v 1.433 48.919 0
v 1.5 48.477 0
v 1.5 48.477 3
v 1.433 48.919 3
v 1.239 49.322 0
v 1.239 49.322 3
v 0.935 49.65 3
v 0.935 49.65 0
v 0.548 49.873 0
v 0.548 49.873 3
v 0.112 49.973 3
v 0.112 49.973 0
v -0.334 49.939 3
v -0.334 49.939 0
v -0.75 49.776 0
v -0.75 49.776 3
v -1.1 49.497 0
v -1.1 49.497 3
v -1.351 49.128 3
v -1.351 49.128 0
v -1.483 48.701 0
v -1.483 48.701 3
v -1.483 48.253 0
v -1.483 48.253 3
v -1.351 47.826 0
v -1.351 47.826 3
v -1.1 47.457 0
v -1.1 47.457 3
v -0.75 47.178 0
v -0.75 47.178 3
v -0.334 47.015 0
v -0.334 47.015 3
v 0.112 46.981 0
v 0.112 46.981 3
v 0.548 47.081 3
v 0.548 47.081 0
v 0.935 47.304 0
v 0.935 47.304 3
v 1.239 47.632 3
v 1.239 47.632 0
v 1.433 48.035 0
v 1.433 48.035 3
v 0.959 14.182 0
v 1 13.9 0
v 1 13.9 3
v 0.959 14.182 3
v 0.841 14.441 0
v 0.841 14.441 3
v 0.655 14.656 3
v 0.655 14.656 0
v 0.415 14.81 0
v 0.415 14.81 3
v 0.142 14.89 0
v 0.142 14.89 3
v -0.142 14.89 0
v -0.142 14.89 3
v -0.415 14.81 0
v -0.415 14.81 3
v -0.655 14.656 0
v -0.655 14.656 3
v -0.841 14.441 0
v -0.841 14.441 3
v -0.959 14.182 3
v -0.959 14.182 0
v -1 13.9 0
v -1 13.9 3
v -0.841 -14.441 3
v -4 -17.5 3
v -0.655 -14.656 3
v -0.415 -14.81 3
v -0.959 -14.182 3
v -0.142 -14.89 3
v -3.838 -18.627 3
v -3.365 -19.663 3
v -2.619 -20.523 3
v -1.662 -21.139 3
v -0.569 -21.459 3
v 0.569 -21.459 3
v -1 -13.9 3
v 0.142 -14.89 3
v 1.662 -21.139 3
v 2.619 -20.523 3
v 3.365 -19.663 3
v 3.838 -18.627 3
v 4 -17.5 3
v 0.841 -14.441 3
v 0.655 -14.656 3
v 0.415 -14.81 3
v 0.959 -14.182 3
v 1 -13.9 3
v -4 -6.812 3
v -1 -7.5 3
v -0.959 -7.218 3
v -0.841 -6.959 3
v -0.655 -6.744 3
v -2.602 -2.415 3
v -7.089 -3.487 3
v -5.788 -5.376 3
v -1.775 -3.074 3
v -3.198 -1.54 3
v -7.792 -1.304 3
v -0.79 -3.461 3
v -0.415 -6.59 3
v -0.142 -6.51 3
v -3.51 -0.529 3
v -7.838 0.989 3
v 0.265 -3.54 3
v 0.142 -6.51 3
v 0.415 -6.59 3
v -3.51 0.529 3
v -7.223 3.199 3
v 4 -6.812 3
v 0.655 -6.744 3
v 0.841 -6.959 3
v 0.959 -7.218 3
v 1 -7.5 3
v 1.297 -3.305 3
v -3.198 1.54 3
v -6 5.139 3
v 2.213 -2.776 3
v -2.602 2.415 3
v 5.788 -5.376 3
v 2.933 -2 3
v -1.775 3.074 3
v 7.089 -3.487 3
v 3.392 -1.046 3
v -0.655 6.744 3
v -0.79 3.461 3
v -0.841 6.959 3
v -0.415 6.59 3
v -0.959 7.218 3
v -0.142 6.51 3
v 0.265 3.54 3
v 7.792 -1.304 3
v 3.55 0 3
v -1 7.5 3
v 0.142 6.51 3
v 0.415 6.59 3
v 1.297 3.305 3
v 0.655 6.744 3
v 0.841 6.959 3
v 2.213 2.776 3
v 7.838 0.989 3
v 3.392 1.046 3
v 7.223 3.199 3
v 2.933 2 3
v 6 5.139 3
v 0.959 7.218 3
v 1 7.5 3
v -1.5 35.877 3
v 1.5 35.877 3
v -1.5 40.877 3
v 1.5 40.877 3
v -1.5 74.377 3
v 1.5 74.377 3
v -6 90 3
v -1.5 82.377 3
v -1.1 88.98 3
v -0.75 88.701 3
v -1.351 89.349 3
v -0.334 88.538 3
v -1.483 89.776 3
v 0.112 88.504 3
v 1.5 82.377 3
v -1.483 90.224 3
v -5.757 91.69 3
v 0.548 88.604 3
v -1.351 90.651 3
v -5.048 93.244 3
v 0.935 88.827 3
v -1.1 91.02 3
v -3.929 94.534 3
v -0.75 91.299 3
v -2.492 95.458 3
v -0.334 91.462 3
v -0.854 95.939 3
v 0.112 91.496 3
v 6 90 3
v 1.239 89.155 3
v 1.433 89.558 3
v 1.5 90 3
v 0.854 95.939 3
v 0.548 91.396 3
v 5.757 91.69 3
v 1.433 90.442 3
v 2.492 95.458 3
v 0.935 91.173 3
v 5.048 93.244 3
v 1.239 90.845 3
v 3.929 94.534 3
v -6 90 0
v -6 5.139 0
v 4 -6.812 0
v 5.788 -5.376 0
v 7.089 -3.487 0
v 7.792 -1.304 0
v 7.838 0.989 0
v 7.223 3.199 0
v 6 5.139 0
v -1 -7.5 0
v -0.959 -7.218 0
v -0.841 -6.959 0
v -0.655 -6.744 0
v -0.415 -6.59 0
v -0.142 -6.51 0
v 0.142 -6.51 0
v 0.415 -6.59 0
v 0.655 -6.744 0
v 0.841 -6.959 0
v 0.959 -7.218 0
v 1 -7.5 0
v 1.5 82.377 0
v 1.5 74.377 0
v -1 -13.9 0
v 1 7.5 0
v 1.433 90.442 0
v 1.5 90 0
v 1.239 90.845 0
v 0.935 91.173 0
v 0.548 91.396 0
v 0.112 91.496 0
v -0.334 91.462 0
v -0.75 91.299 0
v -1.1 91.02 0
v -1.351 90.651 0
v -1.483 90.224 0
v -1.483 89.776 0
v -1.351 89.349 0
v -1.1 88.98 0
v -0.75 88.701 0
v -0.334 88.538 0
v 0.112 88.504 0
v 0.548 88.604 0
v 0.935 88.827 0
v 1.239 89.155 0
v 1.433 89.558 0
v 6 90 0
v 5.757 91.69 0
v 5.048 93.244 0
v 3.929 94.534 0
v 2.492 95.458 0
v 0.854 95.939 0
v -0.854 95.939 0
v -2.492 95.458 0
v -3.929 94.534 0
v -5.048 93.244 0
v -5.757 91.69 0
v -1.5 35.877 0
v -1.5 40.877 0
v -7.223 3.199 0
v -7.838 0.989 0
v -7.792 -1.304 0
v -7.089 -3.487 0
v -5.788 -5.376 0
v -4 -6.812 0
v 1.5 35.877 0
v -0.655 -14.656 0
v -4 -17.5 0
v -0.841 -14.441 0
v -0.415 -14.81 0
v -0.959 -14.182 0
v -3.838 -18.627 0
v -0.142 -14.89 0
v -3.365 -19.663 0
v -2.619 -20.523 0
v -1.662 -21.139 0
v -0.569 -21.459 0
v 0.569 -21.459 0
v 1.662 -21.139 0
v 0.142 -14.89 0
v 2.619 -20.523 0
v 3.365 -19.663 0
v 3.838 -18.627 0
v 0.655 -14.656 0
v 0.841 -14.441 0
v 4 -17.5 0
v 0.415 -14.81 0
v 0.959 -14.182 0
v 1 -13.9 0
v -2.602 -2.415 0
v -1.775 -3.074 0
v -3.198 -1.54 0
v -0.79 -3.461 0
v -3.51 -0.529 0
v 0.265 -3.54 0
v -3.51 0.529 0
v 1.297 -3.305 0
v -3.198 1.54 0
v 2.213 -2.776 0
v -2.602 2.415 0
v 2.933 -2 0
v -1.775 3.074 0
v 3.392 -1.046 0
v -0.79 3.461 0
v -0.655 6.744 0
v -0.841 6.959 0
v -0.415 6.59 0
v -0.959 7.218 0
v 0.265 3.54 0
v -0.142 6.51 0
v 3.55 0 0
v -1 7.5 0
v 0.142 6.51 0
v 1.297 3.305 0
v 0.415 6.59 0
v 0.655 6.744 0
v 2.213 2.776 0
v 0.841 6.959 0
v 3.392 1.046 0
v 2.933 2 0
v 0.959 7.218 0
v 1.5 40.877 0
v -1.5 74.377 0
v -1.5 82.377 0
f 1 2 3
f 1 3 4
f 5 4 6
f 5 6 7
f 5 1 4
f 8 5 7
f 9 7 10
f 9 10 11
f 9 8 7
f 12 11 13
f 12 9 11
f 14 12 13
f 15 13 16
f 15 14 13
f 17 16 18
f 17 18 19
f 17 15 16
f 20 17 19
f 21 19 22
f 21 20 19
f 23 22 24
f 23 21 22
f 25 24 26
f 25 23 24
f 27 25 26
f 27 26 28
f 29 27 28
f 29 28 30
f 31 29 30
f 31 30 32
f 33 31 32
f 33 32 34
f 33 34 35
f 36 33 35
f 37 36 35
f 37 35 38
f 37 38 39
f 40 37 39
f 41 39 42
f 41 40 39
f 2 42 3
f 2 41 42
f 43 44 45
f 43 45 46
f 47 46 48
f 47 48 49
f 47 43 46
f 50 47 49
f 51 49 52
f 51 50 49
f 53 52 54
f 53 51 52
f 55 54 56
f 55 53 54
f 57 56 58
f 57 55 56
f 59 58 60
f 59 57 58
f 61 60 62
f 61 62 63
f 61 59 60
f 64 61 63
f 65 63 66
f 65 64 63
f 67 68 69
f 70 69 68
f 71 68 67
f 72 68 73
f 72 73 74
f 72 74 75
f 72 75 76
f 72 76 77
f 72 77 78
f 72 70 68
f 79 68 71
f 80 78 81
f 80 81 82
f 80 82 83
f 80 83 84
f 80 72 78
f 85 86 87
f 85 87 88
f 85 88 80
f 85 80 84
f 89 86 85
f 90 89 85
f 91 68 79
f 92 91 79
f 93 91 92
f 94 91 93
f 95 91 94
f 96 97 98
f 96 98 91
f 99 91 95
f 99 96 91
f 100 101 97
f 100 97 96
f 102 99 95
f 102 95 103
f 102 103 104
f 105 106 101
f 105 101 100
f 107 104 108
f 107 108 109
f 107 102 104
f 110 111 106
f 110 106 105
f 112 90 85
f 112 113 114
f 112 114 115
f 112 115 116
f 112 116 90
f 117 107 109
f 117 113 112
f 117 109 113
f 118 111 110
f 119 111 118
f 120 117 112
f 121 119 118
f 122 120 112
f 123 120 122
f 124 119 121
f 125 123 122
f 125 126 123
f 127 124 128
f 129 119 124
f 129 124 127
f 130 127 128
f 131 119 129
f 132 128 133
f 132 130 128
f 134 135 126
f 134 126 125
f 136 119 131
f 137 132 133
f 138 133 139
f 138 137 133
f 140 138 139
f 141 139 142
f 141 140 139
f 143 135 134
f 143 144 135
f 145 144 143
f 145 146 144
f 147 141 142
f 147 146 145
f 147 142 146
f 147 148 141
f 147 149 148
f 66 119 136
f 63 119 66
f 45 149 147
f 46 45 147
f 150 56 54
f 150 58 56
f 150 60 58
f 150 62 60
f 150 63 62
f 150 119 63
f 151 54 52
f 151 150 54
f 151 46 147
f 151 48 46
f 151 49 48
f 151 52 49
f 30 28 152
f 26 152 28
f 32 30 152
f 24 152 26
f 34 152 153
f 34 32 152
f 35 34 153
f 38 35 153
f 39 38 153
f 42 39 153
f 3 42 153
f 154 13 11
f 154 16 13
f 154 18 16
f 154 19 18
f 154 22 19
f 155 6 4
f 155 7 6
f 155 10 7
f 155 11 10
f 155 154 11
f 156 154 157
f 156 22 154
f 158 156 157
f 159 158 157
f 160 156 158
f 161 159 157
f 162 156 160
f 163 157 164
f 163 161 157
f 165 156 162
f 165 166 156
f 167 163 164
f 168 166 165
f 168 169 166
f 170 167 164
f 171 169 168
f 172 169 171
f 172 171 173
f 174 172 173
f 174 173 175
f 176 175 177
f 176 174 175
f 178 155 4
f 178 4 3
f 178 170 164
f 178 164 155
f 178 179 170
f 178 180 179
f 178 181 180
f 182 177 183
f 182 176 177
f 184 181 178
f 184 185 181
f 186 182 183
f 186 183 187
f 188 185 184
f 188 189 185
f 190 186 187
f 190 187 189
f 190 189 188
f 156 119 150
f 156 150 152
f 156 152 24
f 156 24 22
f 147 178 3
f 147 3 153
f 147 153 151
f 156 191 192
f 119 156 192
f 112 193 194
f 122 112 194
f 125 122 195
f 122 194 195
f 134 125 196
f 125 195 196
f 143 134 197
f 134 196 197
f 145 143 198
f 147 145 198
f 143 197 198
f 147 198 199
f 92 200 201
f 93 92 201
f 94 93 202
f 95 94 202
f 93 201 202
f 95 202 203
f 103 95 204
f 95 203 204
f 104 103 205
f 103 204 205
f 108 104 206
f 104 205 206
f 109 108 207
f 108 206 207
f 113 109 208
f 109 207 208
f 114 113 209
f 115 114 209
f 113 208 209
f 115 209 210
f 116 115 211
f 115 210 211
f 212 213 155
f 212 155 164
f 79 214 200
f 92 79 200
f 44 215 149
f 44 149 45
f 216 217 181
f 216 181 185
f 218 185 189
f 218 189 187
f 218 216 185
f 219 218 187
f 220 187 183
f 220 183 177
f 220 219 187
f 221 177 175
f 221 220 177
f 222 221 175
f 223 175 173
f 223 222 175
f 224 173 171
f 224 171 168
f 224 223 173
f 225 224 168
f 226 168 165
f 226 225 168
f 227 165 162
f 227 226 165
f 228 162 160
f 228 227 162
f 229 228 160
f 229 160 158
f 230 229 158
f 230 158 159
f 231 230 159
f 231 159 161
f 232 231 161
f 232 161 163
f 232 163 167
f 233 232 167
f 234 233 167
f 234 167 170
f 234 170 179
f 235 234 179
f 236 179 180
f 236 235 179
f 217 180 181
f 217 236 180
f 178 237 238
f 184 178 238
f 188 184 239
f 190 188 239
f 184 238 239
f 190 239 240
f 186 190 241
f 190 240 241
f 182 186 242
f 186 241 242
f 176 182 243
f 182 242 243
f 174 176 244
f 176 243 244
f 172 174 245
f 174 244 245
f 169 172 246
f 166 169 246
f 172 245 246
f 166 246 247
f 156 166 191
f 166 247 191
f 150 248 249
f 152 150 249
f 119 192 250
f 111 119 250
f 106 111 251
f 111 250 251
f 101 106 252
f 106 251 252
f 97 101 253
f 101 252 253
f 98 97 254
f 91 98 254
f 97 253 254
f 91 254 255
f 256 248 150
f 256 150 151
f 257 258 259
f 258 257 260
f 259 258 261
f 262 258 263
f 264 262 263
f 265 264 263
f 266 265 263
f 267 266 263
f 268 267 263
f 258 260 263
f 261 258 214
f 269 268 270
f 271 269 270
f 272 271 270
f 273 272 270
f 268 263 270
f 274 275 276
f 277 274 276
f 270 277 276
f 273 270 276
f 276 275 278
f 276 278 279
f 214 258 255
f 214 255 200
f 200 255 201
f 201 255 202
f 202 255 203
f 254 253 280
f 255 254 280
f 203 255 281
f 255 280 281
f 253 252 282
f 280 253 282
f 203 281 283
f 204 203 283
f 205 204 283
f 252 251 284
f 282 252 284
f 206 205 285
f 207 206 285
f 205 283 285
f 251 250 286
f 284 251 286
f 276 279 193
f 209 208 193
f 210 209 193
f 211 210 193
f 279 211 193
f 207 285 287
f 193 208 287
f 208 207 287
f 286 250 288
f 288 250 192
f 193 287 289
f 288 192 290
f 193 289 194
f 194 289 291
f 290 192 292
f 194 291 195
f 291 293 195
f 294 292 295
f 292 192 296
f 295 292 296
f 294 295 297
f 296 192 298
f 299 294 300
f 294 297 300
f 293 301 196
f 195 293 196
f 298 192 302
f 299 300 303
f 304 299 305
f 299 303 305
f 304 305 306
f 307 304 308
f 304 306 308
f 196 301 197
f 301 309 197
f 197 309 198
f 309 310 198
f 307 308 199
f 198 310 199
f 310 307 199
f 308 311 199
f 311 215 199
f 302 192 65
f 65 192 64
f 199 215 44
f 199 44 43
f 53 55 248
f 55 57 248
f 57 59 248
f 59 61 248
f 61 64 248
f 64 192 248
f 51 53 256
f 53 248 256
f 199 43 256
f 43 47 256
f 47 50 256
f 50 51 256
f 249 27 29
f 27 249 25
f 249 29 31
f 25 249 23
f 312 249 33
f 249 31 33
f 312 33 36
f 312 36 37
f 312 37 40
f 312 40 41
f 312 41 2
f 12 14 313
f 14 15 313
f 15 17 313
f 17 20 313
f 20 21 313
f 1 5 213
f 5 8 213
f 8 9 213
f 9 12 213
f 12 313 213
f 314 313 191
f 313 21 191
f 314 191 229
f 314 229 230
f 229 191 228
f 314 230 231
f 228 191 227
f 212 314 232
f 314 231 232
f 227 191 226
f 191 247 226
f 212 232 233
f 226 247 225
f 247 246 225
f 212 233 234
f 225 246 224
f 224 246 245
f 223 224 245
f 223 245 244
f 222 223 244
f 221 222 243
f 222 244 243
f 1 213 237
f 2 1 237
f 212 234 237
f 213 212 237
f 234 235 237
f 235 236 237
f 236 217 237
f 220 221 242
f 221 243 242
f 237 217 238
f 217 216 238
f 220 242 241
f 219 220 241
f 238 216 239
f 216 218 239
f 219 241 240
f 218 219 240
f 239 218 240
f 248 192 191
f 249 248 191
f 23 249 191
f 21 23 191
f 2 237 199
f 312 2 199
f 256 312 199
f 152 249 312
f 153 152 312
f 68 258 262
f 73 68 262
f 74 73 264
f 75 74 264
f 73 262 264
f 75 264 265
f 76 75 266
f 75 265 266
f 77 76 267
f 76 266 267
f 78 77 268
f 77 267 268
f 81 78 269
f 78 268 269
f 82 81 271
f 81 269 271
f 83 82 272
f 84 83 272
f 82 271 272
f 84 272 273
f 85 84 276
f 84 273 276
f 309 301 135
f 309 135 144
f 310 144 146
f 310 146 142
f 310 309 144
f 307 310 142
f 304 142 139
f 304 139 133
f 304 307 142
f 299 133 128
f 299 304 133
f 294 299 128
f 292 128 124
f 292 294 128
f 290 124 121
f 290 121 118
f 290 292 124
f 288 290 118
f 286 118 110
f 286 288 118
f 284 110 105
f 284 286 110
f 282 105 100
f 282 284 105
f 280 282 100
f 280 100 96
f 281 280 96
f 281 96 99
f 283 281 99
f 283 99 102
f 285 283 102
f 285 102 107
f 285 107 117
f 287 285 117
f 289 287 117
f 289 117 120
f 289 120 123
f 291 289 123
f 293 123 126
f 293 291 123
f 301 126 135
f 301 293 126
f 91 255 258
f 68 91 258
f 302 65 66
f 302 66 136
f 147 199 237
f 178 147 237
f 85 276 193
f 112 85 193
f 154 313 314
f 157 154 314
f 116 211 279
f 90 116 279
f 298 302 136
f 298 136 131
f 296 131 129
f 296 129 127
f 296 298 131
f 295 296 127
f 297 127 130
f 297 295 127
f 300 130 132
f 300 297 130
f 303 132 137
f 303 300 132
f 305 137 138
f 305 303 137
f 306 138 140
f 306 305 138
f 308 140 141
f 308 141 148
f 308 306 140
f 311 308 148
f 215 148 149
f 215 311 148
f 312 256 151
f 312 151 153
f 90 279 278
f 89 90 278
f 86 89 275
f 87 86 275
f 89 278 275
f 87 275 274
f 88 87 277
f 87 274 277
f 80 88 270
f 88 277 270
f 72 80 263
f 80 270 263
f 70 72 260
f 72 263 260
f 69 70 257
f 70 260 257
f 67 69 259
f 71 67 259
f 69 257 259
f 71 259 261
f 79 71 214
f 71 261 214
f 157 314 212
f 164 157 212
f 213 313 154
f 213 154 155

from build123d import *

# Parameters (mm, degrees)
SKETCH1_R           = 3.55
SKETCH1_W           = 3
SKETCH1_H           = 5
SKETCH1_H_2         = 8
SKETCH1_R_2         = 1.5
BOSS_EXTRUDE1_DEPTH = 3


with BuildPart() as part:
    # Sketch1 → Boss-Extrude1 (new body)
    with BuildSketch(Plane.XY):
        with BuildLine():
            ThreePointArc((6, 90), (0, 96), (-6, 90))
            Line((-6, 90), (-6, 5.139066063))
            ThreePointArc((-6, 5.139066063), (-7.791656712, -1.303873341), (-4, -6.812488532))
            Line((-4, -6.812488532), (-4, -17.5))
            ThreePointArc((-4, -17.5), (0, -21.5), (4, -17.5))
            Line((4, -17.5), (4, -6.812488532))
            ThreePointArc((4, -6.812488532), (7.791656712, -1.303873341), (6, 5.139066063))
            Line((6, 5.139066063), (6, 90))
        make_face()
        with BuildLine():
            ThreePointArc((-1, -7.5), (0, -6.5), (1, -7.5))
            Line((1, -7.5), (1, -13.9))
            ThreePointArc((1, -13.9), (0, -14.9), (-1, -13.9))
            Line((-1, -13.9), (-1, -7.5))
        make_face(mode=Mode.SUBTRACT)
        Circle(SKETCH1_R, mode=Mode.SUBTRACT)
        with BuildLine():
            Line((1, 13.9), (1, 7.5))
            ThreePointArc((1, 7.5), (0, 6.5), (-1, 7.5))
            Line((-1, 7.5), (-1, 13.9))
            ThreePointArc((-1, 13.9), (0, 14.9), (1, 13.9))
        make_face(mode=Mode.SUBTRACT)
        with Locations((0, 38.376985236)):
            Rectangle(SKETCH1_W, SKETCH1_H, mode=Mode.SUBTRACT)
        with BuildLine():
            ThreePointArc((1.060660172, 47.416325064), (-1.060660172, 47.416325064), (-1.060660172, 49.537645408))
            ThreePointArc((-1.060660172, 49.537645408), (0.574025149, 49.862804535), (1.5, 48.476985236))
            ThreePointArc((1.5, 48.476985236), (1.385819299, 47.902960087), (1.060660172, 47.416325064))
        make_face(mode=Mode.SUBTRACT)
        with Locations((0, 78.376985236)):
            Rectangle(SKETCH1_W, SKETCH1_H_2, mode=Mode.SUBTRACT)
        with Locations((0, 90)):
            Circle(SKETCH1_R_2, mode=Mode.SUBTRACT)
    extrude(amount=BOSS_EXTRUDE1_DEPTH)


solid = part.part
